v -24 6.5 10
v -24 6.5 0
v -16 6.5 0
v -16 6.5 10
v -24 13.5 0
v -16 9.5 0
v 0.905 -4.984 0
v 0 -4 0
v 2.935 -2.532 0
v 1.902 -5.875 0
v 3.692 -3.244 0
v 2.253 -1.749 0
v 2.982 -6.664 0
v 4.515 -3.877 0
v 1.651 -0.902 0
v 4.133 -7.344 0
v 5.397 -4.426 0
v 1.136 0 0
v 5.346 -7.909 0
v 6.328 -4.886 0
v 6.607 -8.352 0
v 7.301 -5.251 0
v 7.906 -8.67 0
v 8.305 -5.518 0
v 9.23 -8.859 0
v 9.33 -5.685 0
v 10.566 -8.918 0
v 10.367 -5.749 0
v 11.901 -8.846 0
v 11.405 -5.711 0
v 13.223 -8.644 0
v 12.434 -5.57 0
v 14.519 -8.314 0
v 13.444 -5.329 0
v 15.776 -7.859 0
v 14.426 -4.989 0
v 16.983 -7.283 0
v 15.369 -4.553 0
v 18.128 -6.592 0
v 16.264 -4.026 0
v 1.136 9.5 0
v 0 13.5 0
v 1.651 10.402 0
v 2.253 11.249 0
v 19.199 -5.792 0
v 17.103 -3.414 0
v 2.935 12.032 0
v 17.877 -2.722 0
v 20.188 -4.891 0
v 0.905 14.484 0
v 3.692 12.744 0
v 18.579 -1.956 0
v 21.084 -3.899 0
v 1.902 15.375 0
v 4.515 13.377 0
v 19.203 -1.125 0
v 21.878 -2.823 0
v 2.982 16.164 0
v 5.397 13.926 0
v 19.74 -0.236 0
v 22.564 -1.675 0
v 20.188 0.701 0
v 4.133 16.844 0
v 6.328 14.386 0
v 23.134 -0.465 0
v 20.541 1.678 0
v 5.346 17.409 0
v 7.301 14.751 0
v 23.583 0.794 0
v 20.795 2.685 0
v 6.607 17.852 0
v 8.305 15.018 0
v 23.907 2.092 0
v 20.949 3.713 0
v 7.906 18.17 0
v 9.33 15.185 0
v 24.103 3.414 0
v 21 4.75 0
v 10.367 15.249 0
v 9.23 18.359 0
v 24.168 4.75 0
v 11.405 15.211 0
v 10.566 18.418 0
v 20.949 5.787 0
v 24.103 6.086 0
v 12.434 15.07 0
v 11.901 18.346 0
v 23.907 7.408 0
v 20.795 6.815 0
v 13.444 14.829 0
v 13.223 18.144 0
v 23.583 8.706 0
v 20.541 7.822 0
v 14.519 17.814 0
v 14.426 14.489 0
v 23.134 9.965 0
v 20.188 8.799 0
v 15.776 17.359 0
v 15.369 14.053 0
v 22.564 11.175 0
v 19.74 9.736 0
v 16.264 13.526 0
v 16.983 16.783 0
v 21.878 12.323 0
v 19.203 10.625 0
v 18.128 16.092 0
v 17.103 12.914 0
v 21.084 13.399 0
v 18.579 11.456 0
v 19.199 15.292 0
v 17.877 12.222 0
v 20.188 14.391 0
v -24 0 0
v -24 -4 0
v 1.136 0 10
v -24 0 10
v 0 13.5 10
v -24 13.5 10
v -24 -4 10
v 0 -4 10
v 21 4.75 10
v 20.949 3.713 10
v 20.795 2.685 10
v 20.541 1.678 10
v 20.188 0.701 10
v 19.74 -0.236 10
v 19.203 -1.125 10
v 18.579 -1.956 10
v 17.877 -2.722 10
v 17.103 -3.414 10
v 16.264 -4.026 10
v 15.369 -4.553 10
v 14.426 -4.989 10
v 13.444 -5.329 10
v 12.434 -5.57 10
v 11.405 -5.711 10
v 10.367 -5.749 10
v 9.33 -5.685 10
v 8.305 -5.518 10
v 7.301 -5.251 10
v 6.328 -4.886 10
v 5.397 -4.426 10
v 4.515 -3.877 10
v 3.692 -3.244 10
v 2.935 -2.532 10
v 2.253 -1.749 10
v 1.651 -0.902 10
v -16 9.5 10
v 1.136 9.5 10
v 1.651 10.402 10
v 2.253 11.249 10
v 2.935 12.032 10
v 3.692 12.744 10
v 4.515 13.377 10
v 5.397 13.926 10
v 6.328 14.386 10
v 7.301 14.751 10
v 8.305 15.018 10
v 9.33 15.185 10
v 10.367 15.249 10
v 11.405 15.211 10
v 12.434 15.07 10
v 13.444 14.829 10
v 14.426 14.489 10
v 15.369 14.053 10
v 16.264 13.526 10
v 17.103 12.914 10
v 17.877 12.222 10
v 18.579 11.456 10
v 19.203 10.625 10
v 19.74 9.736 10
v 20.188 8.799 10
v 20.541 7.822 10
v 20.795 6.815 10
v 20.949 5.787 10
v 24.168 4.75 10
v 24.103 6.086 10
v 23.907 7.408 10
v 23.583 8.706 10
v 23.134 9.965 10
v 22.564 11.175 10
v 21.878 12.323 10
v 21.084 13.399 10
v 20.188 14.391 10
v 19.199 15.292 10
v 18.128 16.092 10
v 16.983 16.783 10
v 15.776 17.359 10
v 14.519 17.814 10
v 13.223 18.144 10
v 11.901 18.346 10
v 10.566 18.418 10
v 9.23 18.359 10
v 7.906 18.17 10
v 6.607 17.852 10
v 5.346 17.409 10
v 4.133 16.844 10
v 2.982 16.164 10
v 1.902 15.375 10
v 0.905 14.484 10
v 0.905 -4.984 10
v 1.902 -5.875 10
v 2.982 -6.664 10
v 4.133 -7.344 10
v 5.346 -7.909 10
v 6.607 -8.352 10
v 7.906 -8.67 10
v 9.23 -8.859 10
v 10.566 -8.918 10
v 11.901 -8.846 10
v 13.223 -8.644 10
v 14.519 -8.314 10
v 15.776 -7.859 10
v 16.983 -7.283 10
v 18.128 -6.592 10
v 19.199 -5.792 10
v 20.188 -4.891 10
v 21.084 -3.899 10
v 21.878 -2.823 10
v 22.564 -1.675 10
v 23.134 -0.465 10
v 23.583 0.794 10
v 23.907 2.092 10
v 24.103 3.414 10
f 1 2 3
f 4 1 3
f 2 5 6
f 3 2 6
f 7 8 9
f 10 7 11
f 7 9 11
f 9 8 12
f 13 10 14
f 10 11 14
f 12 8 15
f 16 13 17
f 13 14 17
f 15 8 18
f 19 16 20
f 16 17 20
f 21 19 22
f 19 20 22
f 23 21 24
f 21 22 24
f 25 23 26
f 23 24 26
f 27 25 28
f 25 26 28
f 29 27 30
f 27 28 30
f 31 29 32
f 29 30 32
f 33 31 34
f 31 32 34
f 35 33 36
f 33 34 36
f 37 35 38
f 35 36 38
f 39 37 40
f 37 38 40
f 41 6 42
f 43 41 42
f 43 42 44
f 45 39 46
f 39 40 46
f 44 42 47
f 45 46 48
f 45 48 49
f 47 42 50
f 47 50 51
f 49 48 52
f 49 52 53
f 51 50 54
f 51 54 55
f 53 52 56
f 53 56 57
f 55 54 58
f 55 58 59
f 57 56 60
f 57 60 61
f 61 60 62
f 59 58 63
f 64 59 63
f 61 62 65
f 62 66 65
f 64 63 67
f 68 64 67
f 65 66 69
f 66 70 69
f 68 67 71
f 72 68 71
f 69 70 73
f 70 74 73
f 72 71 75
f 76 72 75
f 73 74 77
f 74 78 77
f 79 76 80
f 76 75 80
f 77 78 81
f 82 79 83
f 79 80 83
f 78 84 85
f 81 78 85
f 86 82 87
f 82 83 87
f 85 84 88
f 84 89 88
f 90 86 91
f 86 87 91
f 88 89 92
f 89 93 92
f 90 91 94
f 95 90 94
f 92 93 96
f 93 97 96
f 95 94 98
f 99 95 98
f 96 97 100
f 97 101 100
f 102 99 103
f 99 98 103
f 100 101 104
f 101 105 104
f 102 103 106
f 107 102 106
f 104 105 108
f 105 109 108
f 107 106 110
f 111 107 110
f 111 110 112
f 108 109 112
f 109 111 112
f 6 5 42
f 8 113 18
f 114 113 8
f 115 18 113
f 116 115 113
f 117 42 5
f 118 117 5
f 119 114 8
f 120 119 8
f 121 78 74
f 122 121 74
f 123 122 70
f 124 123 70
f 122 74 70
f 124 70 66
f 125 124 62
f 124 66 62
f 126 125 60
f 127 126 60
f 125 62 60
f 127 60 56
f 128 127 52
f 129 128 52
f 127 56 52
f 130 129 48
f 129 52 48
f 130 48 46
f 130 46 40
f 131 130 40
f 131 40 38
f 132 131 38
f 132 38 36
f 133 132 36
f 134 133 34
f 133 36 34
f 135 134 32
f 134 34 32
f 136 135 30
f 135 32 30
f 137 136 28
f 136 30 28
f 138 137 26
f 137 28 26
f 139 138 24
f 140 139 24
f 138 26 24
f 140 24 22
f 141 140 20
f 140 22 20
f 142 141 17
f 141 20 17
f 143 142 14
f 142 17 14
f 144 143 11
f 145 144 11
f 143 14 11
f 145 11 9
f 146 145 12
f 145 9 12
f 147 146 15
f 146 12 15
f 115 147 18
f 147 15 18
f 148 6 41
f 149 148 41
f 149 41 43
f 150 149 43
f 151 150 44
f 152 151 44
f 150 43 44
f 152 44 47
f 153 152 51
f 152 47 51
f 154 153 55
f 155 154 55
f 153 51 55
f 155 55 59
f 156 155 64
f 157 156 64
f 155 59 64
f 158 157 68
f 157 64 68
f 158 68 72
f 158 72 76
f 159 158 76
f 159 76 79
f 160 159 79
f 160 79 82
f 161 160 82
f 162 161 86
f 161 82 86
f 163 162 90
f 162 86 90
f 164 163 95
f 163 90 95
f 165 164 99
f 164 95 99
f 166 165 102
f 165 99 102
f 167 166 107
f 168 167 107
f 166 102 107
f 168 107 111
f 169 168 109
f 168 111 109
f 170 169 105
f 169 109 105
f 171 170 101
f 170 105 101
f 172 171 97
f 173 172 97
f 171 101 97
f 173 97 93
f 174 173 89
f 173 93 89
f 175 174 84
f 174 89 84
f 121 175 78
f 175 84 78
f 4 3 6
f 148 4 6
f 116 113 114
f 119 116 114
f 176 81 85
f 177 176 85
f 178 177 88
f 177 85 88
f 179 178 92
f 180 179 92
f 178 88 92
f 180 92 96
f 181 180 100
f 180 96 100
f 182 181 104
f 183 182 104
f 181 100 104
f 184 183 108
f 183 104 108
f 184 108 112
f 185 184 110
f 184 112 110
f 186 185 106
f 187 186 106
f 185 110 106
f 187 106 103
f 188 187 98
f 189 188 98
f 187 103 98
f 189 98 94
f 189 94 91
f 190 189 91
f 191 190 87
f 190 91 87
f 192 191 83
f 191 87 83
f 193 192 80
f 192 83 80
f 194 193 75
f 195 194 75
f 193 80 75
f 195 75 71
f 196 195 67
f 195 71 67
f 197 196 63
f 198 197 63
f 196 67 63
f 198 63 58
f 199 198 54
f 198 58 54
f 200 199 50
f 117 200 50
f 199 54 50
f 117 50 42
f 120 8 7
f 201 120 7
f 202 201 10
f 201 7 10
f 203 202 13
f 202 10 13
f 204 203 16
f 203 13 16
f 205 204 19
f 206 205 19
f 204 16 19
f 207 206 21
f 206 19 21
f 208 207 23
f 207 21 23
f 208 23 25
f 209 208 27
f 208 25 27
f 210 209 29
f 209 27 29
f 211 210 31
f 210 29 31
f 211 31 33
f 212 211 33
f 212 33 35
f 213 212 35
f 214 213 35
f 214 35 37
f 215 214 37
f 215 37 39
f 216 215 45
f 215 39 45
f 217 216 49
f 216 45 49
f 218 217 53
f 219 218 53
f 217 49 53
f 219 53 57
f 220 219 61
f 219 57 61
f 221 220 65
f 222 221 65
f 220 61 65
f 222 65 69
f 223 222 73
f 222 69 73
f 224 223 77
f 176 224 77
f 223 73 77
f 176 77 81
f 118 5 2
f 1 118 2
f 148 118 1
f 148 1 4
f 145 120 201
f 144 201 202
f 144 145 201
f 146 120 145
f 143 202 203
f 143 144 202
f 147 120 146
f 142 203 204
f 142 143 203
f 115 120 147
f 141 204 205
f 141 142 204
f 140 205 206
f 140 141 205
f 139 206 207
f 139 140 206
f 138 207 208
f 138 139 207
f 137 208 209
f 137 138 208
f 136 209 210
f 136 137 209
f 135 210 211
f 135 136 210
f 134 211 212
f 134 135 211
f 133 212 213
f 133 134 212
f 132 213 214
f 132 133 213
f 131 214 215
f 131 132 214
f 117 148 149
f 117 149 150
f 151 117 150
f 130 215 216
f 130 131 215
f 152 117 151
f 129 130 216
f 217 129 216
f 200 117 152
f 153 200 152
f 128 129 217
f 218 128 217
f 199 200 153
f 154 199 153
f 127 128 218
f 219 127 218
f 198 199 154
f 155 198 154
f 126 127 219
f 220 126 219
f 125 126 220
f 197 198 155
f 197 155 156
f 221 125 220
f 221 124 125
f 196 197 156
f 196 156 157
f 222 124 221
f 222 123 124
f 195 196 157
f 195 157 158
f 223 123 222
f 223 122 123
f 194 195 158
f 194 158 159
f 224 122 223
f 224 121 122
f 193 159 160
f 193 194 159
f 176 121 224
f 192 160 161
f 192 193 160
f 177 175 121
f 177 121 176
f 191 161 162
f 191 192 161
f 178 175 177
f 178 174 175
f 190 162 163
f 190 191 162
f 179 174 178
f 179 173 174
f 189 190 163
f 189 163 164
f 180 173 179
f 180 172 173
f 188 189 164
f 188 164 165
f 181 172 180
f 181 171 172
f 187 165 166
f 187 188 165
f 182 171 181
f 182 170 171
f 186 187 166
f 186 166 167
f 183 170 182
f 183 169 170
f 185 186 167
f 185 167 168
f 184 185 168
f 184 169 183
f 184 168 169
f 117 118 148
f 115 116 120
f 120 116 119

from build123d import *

# Parameters (mm, degrees)
F0_W     = 8
F0_H     = 3
F1_DEPTH = 10


with BuildPart() as f1:
    # F0 (on Top) → F1 (new body)
    with BuildSketch(Plane.XY):
        with BuildLine():
            Line((-2.316006, 0), (-24, 0))
            Line((-24, 0), (-24, -4))
            Line((-24, -4), (0, -4))
            ThreePointArc((0, -4), (-1.328315, -2.098611), (-2.316006, 0))
        make_face()
        with BuildLine():
            Line((-24, 13.5), (-24, 9.5))
            Line((-24, 9.5), (-16, 9.5))
            Line((-16, 9.5), (-2.316006, 9.5))
            ThreePointArc((-2.316006, 9.5), (-1.328315, 11.598611), (0, 13.5))
            Line((0, 13.5), (-24, 13.5))
        make_face()
        with Locations((-20, 8)):
            Rectangle(F0_W, F0_H)
        with BuildLine():
            ThreePointArc((0, 13.5), (-1.328315, 11.598611), (-2.316006, 9.5))
            Line((-2.316006, 9.5), (0, 9.5))
            Line((0, 9.5), (0, 13.5))
        make_face()
        with BuildLine():
            ThreePointArc((24.167937, 4.75), (15.152911, 17.601573), (0, 13.5))
            Line((0, 13.5), (0, 9.5))
            Line((0, 9.5), (1.13584, 9.5))
            ThreePointArc((1.13584, 9.5), (12.941958, 14.962093), (21, 4.75))
            ThreePointArc((21, 4.75), (12.941958, -5.462093), (1.13584, 0))
            Line((1.13584, 0), (0, 0))
            Line((0, 0), (0, -4))
            ThreePointArc((0, -4), (15.152911, -8.101573), (24.167937, 4.75))
        make_face()
        with BuildLine():
            Line((0, 0), (-2.316006, 0))
            ThreePointArc((-2.316006, 0), (-1.328315, -2.098611), (0, -4))
            Line((0, -4), (0, 0))
        make_face()
    extrude(amount=F1_DEPTH)


solid = f1.part
